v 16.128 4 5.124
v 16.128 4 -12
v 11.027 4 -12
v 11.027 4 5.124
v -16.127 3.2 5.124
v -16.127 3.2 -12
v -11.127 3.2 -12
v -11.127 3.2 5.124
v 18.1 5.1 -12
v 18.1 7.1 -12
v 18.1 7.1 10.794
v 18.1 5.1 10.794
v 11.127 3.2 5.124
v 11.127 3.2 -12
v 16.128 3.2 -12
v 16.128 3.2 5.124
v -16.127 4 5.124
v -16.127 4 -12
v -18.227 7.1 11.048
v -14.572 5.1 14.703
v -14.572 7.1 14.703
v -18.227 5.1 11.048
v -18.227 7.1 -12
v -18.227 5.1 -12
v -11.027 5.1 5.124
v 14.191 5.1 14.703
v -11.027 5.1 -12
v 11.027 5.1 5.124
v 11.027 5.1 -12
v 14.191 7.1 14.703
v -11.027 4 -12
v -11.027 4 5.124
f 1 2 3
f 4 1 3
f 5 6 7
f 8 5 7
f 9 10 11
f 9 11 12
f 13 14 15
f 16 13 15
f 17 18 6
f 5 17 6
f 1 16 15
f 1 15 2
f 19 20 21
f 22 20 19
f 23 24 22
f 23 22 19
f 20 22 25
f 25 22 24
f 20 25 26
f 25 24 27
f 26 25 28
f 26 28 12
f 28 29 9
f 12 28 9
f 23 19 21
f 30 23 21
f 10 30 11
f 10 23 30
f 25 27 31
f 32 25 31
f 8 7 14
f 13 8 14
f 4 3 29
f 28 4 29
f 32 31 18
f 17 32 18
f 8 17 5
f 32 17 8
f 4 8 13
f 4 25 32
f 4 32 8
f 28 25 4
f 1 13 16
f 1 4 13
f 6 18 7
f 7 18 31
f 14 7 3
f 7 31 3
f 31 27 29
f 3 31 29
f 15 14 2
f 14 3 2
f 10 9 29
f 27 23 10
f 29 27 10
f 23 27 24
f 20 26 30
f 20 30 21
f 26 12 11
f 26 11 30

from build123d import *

# Parameters (mm, degrees)
EXTRUDE_1_DEPTH          = 5.124133
EXTRUDE_1_DEPTH_BACK     = 12
EXTRUDE_2_DEPTH          = 10
CUT_EXTRUDE_1_DEPTH      = 25.003853471
CUT_EXTRUDE_1_DEPTH_BACK = 25.003853471


with BuildPart() as part:
    # 草图1 → 凸台-拉伸1 (new, two sides: drawn at the far end of the back side and taken through both)
    with BuildSketch(Plane.XY.offset(-EXTRUDE_1_DEPTH_BACK)):
        Polygon((-16.127330455, 4), (-16.127330455, 3.2), (-11.127330455, 3.2), (11.127330455, 3.200000056), (16.127758191, 3.200000069), (16.127758191, 4), (11.027330455, 4), (11.027330455, 5.1), (18.100330201, 5.1), (18.100330201, 7.1), (-18.227330455, 7.1), (-18.227330455, 5.1), (-11.027330455, 5.1), (-11.027330455, 4), align=None)
    extrude(amount=EXTRUDE_1_DEPTH + EXTRUDE_1_DEPTH_BACK)

    # 草图2 → 凸台-拉伸2 (add)
    with BuildSketch(Plane.XY.offset(5.12413323)):
        Polygon((11.027330455, 5.1), (-11.027330455, 5.1), (-18.227330455, 5.1), (-18.227330455, 7.1), (18.100330201, 7.1), (18.100330201, 5.1), align=None)
    extrude(amount=EXTRUDE_2_DEPTH)

    # 草图3 → 切除-拉伸1 (cut, two sides: drawn at the far end of the back side and taken through both)
    with BuildSketch(Plane(origin=(0, 7.1, 0), x_dir=(1, 0, 0), z_dir=(0, 1, 0)).offset(-CUT_EXTRUDE_1_DEPTH_BACK)):
        Polygon((18.100330201, -5.12413323), (18.100330201, -10.794403278), (18.100330201, -15.12413323), (-18.227330455, -15.12413323), (-18.227330455, -11.048403786), (-18.227330455, -5.12413323), (-20.378002423, -5.448805372), (-20.378002423, -17.361495583), (22.540888442, -17.361495583), (22.540888442, -5.12413323), align=None)
        Polygon((18.100330201, -15.12413323), (18.100330201, -10.794403278), (14.191406072, -14.703327407), (-14.572406834, -14.703327407), (-18.227330455, -11.048403786), (-18.227330455, -15.12413323), align=None)
    extrude(amount=CUT_EXTRUDE_1_DEPTH + CUT_EXTRUDE_1_DEPTH_BACK, mode=Mode.SUBTRACT)


solid = part.part
